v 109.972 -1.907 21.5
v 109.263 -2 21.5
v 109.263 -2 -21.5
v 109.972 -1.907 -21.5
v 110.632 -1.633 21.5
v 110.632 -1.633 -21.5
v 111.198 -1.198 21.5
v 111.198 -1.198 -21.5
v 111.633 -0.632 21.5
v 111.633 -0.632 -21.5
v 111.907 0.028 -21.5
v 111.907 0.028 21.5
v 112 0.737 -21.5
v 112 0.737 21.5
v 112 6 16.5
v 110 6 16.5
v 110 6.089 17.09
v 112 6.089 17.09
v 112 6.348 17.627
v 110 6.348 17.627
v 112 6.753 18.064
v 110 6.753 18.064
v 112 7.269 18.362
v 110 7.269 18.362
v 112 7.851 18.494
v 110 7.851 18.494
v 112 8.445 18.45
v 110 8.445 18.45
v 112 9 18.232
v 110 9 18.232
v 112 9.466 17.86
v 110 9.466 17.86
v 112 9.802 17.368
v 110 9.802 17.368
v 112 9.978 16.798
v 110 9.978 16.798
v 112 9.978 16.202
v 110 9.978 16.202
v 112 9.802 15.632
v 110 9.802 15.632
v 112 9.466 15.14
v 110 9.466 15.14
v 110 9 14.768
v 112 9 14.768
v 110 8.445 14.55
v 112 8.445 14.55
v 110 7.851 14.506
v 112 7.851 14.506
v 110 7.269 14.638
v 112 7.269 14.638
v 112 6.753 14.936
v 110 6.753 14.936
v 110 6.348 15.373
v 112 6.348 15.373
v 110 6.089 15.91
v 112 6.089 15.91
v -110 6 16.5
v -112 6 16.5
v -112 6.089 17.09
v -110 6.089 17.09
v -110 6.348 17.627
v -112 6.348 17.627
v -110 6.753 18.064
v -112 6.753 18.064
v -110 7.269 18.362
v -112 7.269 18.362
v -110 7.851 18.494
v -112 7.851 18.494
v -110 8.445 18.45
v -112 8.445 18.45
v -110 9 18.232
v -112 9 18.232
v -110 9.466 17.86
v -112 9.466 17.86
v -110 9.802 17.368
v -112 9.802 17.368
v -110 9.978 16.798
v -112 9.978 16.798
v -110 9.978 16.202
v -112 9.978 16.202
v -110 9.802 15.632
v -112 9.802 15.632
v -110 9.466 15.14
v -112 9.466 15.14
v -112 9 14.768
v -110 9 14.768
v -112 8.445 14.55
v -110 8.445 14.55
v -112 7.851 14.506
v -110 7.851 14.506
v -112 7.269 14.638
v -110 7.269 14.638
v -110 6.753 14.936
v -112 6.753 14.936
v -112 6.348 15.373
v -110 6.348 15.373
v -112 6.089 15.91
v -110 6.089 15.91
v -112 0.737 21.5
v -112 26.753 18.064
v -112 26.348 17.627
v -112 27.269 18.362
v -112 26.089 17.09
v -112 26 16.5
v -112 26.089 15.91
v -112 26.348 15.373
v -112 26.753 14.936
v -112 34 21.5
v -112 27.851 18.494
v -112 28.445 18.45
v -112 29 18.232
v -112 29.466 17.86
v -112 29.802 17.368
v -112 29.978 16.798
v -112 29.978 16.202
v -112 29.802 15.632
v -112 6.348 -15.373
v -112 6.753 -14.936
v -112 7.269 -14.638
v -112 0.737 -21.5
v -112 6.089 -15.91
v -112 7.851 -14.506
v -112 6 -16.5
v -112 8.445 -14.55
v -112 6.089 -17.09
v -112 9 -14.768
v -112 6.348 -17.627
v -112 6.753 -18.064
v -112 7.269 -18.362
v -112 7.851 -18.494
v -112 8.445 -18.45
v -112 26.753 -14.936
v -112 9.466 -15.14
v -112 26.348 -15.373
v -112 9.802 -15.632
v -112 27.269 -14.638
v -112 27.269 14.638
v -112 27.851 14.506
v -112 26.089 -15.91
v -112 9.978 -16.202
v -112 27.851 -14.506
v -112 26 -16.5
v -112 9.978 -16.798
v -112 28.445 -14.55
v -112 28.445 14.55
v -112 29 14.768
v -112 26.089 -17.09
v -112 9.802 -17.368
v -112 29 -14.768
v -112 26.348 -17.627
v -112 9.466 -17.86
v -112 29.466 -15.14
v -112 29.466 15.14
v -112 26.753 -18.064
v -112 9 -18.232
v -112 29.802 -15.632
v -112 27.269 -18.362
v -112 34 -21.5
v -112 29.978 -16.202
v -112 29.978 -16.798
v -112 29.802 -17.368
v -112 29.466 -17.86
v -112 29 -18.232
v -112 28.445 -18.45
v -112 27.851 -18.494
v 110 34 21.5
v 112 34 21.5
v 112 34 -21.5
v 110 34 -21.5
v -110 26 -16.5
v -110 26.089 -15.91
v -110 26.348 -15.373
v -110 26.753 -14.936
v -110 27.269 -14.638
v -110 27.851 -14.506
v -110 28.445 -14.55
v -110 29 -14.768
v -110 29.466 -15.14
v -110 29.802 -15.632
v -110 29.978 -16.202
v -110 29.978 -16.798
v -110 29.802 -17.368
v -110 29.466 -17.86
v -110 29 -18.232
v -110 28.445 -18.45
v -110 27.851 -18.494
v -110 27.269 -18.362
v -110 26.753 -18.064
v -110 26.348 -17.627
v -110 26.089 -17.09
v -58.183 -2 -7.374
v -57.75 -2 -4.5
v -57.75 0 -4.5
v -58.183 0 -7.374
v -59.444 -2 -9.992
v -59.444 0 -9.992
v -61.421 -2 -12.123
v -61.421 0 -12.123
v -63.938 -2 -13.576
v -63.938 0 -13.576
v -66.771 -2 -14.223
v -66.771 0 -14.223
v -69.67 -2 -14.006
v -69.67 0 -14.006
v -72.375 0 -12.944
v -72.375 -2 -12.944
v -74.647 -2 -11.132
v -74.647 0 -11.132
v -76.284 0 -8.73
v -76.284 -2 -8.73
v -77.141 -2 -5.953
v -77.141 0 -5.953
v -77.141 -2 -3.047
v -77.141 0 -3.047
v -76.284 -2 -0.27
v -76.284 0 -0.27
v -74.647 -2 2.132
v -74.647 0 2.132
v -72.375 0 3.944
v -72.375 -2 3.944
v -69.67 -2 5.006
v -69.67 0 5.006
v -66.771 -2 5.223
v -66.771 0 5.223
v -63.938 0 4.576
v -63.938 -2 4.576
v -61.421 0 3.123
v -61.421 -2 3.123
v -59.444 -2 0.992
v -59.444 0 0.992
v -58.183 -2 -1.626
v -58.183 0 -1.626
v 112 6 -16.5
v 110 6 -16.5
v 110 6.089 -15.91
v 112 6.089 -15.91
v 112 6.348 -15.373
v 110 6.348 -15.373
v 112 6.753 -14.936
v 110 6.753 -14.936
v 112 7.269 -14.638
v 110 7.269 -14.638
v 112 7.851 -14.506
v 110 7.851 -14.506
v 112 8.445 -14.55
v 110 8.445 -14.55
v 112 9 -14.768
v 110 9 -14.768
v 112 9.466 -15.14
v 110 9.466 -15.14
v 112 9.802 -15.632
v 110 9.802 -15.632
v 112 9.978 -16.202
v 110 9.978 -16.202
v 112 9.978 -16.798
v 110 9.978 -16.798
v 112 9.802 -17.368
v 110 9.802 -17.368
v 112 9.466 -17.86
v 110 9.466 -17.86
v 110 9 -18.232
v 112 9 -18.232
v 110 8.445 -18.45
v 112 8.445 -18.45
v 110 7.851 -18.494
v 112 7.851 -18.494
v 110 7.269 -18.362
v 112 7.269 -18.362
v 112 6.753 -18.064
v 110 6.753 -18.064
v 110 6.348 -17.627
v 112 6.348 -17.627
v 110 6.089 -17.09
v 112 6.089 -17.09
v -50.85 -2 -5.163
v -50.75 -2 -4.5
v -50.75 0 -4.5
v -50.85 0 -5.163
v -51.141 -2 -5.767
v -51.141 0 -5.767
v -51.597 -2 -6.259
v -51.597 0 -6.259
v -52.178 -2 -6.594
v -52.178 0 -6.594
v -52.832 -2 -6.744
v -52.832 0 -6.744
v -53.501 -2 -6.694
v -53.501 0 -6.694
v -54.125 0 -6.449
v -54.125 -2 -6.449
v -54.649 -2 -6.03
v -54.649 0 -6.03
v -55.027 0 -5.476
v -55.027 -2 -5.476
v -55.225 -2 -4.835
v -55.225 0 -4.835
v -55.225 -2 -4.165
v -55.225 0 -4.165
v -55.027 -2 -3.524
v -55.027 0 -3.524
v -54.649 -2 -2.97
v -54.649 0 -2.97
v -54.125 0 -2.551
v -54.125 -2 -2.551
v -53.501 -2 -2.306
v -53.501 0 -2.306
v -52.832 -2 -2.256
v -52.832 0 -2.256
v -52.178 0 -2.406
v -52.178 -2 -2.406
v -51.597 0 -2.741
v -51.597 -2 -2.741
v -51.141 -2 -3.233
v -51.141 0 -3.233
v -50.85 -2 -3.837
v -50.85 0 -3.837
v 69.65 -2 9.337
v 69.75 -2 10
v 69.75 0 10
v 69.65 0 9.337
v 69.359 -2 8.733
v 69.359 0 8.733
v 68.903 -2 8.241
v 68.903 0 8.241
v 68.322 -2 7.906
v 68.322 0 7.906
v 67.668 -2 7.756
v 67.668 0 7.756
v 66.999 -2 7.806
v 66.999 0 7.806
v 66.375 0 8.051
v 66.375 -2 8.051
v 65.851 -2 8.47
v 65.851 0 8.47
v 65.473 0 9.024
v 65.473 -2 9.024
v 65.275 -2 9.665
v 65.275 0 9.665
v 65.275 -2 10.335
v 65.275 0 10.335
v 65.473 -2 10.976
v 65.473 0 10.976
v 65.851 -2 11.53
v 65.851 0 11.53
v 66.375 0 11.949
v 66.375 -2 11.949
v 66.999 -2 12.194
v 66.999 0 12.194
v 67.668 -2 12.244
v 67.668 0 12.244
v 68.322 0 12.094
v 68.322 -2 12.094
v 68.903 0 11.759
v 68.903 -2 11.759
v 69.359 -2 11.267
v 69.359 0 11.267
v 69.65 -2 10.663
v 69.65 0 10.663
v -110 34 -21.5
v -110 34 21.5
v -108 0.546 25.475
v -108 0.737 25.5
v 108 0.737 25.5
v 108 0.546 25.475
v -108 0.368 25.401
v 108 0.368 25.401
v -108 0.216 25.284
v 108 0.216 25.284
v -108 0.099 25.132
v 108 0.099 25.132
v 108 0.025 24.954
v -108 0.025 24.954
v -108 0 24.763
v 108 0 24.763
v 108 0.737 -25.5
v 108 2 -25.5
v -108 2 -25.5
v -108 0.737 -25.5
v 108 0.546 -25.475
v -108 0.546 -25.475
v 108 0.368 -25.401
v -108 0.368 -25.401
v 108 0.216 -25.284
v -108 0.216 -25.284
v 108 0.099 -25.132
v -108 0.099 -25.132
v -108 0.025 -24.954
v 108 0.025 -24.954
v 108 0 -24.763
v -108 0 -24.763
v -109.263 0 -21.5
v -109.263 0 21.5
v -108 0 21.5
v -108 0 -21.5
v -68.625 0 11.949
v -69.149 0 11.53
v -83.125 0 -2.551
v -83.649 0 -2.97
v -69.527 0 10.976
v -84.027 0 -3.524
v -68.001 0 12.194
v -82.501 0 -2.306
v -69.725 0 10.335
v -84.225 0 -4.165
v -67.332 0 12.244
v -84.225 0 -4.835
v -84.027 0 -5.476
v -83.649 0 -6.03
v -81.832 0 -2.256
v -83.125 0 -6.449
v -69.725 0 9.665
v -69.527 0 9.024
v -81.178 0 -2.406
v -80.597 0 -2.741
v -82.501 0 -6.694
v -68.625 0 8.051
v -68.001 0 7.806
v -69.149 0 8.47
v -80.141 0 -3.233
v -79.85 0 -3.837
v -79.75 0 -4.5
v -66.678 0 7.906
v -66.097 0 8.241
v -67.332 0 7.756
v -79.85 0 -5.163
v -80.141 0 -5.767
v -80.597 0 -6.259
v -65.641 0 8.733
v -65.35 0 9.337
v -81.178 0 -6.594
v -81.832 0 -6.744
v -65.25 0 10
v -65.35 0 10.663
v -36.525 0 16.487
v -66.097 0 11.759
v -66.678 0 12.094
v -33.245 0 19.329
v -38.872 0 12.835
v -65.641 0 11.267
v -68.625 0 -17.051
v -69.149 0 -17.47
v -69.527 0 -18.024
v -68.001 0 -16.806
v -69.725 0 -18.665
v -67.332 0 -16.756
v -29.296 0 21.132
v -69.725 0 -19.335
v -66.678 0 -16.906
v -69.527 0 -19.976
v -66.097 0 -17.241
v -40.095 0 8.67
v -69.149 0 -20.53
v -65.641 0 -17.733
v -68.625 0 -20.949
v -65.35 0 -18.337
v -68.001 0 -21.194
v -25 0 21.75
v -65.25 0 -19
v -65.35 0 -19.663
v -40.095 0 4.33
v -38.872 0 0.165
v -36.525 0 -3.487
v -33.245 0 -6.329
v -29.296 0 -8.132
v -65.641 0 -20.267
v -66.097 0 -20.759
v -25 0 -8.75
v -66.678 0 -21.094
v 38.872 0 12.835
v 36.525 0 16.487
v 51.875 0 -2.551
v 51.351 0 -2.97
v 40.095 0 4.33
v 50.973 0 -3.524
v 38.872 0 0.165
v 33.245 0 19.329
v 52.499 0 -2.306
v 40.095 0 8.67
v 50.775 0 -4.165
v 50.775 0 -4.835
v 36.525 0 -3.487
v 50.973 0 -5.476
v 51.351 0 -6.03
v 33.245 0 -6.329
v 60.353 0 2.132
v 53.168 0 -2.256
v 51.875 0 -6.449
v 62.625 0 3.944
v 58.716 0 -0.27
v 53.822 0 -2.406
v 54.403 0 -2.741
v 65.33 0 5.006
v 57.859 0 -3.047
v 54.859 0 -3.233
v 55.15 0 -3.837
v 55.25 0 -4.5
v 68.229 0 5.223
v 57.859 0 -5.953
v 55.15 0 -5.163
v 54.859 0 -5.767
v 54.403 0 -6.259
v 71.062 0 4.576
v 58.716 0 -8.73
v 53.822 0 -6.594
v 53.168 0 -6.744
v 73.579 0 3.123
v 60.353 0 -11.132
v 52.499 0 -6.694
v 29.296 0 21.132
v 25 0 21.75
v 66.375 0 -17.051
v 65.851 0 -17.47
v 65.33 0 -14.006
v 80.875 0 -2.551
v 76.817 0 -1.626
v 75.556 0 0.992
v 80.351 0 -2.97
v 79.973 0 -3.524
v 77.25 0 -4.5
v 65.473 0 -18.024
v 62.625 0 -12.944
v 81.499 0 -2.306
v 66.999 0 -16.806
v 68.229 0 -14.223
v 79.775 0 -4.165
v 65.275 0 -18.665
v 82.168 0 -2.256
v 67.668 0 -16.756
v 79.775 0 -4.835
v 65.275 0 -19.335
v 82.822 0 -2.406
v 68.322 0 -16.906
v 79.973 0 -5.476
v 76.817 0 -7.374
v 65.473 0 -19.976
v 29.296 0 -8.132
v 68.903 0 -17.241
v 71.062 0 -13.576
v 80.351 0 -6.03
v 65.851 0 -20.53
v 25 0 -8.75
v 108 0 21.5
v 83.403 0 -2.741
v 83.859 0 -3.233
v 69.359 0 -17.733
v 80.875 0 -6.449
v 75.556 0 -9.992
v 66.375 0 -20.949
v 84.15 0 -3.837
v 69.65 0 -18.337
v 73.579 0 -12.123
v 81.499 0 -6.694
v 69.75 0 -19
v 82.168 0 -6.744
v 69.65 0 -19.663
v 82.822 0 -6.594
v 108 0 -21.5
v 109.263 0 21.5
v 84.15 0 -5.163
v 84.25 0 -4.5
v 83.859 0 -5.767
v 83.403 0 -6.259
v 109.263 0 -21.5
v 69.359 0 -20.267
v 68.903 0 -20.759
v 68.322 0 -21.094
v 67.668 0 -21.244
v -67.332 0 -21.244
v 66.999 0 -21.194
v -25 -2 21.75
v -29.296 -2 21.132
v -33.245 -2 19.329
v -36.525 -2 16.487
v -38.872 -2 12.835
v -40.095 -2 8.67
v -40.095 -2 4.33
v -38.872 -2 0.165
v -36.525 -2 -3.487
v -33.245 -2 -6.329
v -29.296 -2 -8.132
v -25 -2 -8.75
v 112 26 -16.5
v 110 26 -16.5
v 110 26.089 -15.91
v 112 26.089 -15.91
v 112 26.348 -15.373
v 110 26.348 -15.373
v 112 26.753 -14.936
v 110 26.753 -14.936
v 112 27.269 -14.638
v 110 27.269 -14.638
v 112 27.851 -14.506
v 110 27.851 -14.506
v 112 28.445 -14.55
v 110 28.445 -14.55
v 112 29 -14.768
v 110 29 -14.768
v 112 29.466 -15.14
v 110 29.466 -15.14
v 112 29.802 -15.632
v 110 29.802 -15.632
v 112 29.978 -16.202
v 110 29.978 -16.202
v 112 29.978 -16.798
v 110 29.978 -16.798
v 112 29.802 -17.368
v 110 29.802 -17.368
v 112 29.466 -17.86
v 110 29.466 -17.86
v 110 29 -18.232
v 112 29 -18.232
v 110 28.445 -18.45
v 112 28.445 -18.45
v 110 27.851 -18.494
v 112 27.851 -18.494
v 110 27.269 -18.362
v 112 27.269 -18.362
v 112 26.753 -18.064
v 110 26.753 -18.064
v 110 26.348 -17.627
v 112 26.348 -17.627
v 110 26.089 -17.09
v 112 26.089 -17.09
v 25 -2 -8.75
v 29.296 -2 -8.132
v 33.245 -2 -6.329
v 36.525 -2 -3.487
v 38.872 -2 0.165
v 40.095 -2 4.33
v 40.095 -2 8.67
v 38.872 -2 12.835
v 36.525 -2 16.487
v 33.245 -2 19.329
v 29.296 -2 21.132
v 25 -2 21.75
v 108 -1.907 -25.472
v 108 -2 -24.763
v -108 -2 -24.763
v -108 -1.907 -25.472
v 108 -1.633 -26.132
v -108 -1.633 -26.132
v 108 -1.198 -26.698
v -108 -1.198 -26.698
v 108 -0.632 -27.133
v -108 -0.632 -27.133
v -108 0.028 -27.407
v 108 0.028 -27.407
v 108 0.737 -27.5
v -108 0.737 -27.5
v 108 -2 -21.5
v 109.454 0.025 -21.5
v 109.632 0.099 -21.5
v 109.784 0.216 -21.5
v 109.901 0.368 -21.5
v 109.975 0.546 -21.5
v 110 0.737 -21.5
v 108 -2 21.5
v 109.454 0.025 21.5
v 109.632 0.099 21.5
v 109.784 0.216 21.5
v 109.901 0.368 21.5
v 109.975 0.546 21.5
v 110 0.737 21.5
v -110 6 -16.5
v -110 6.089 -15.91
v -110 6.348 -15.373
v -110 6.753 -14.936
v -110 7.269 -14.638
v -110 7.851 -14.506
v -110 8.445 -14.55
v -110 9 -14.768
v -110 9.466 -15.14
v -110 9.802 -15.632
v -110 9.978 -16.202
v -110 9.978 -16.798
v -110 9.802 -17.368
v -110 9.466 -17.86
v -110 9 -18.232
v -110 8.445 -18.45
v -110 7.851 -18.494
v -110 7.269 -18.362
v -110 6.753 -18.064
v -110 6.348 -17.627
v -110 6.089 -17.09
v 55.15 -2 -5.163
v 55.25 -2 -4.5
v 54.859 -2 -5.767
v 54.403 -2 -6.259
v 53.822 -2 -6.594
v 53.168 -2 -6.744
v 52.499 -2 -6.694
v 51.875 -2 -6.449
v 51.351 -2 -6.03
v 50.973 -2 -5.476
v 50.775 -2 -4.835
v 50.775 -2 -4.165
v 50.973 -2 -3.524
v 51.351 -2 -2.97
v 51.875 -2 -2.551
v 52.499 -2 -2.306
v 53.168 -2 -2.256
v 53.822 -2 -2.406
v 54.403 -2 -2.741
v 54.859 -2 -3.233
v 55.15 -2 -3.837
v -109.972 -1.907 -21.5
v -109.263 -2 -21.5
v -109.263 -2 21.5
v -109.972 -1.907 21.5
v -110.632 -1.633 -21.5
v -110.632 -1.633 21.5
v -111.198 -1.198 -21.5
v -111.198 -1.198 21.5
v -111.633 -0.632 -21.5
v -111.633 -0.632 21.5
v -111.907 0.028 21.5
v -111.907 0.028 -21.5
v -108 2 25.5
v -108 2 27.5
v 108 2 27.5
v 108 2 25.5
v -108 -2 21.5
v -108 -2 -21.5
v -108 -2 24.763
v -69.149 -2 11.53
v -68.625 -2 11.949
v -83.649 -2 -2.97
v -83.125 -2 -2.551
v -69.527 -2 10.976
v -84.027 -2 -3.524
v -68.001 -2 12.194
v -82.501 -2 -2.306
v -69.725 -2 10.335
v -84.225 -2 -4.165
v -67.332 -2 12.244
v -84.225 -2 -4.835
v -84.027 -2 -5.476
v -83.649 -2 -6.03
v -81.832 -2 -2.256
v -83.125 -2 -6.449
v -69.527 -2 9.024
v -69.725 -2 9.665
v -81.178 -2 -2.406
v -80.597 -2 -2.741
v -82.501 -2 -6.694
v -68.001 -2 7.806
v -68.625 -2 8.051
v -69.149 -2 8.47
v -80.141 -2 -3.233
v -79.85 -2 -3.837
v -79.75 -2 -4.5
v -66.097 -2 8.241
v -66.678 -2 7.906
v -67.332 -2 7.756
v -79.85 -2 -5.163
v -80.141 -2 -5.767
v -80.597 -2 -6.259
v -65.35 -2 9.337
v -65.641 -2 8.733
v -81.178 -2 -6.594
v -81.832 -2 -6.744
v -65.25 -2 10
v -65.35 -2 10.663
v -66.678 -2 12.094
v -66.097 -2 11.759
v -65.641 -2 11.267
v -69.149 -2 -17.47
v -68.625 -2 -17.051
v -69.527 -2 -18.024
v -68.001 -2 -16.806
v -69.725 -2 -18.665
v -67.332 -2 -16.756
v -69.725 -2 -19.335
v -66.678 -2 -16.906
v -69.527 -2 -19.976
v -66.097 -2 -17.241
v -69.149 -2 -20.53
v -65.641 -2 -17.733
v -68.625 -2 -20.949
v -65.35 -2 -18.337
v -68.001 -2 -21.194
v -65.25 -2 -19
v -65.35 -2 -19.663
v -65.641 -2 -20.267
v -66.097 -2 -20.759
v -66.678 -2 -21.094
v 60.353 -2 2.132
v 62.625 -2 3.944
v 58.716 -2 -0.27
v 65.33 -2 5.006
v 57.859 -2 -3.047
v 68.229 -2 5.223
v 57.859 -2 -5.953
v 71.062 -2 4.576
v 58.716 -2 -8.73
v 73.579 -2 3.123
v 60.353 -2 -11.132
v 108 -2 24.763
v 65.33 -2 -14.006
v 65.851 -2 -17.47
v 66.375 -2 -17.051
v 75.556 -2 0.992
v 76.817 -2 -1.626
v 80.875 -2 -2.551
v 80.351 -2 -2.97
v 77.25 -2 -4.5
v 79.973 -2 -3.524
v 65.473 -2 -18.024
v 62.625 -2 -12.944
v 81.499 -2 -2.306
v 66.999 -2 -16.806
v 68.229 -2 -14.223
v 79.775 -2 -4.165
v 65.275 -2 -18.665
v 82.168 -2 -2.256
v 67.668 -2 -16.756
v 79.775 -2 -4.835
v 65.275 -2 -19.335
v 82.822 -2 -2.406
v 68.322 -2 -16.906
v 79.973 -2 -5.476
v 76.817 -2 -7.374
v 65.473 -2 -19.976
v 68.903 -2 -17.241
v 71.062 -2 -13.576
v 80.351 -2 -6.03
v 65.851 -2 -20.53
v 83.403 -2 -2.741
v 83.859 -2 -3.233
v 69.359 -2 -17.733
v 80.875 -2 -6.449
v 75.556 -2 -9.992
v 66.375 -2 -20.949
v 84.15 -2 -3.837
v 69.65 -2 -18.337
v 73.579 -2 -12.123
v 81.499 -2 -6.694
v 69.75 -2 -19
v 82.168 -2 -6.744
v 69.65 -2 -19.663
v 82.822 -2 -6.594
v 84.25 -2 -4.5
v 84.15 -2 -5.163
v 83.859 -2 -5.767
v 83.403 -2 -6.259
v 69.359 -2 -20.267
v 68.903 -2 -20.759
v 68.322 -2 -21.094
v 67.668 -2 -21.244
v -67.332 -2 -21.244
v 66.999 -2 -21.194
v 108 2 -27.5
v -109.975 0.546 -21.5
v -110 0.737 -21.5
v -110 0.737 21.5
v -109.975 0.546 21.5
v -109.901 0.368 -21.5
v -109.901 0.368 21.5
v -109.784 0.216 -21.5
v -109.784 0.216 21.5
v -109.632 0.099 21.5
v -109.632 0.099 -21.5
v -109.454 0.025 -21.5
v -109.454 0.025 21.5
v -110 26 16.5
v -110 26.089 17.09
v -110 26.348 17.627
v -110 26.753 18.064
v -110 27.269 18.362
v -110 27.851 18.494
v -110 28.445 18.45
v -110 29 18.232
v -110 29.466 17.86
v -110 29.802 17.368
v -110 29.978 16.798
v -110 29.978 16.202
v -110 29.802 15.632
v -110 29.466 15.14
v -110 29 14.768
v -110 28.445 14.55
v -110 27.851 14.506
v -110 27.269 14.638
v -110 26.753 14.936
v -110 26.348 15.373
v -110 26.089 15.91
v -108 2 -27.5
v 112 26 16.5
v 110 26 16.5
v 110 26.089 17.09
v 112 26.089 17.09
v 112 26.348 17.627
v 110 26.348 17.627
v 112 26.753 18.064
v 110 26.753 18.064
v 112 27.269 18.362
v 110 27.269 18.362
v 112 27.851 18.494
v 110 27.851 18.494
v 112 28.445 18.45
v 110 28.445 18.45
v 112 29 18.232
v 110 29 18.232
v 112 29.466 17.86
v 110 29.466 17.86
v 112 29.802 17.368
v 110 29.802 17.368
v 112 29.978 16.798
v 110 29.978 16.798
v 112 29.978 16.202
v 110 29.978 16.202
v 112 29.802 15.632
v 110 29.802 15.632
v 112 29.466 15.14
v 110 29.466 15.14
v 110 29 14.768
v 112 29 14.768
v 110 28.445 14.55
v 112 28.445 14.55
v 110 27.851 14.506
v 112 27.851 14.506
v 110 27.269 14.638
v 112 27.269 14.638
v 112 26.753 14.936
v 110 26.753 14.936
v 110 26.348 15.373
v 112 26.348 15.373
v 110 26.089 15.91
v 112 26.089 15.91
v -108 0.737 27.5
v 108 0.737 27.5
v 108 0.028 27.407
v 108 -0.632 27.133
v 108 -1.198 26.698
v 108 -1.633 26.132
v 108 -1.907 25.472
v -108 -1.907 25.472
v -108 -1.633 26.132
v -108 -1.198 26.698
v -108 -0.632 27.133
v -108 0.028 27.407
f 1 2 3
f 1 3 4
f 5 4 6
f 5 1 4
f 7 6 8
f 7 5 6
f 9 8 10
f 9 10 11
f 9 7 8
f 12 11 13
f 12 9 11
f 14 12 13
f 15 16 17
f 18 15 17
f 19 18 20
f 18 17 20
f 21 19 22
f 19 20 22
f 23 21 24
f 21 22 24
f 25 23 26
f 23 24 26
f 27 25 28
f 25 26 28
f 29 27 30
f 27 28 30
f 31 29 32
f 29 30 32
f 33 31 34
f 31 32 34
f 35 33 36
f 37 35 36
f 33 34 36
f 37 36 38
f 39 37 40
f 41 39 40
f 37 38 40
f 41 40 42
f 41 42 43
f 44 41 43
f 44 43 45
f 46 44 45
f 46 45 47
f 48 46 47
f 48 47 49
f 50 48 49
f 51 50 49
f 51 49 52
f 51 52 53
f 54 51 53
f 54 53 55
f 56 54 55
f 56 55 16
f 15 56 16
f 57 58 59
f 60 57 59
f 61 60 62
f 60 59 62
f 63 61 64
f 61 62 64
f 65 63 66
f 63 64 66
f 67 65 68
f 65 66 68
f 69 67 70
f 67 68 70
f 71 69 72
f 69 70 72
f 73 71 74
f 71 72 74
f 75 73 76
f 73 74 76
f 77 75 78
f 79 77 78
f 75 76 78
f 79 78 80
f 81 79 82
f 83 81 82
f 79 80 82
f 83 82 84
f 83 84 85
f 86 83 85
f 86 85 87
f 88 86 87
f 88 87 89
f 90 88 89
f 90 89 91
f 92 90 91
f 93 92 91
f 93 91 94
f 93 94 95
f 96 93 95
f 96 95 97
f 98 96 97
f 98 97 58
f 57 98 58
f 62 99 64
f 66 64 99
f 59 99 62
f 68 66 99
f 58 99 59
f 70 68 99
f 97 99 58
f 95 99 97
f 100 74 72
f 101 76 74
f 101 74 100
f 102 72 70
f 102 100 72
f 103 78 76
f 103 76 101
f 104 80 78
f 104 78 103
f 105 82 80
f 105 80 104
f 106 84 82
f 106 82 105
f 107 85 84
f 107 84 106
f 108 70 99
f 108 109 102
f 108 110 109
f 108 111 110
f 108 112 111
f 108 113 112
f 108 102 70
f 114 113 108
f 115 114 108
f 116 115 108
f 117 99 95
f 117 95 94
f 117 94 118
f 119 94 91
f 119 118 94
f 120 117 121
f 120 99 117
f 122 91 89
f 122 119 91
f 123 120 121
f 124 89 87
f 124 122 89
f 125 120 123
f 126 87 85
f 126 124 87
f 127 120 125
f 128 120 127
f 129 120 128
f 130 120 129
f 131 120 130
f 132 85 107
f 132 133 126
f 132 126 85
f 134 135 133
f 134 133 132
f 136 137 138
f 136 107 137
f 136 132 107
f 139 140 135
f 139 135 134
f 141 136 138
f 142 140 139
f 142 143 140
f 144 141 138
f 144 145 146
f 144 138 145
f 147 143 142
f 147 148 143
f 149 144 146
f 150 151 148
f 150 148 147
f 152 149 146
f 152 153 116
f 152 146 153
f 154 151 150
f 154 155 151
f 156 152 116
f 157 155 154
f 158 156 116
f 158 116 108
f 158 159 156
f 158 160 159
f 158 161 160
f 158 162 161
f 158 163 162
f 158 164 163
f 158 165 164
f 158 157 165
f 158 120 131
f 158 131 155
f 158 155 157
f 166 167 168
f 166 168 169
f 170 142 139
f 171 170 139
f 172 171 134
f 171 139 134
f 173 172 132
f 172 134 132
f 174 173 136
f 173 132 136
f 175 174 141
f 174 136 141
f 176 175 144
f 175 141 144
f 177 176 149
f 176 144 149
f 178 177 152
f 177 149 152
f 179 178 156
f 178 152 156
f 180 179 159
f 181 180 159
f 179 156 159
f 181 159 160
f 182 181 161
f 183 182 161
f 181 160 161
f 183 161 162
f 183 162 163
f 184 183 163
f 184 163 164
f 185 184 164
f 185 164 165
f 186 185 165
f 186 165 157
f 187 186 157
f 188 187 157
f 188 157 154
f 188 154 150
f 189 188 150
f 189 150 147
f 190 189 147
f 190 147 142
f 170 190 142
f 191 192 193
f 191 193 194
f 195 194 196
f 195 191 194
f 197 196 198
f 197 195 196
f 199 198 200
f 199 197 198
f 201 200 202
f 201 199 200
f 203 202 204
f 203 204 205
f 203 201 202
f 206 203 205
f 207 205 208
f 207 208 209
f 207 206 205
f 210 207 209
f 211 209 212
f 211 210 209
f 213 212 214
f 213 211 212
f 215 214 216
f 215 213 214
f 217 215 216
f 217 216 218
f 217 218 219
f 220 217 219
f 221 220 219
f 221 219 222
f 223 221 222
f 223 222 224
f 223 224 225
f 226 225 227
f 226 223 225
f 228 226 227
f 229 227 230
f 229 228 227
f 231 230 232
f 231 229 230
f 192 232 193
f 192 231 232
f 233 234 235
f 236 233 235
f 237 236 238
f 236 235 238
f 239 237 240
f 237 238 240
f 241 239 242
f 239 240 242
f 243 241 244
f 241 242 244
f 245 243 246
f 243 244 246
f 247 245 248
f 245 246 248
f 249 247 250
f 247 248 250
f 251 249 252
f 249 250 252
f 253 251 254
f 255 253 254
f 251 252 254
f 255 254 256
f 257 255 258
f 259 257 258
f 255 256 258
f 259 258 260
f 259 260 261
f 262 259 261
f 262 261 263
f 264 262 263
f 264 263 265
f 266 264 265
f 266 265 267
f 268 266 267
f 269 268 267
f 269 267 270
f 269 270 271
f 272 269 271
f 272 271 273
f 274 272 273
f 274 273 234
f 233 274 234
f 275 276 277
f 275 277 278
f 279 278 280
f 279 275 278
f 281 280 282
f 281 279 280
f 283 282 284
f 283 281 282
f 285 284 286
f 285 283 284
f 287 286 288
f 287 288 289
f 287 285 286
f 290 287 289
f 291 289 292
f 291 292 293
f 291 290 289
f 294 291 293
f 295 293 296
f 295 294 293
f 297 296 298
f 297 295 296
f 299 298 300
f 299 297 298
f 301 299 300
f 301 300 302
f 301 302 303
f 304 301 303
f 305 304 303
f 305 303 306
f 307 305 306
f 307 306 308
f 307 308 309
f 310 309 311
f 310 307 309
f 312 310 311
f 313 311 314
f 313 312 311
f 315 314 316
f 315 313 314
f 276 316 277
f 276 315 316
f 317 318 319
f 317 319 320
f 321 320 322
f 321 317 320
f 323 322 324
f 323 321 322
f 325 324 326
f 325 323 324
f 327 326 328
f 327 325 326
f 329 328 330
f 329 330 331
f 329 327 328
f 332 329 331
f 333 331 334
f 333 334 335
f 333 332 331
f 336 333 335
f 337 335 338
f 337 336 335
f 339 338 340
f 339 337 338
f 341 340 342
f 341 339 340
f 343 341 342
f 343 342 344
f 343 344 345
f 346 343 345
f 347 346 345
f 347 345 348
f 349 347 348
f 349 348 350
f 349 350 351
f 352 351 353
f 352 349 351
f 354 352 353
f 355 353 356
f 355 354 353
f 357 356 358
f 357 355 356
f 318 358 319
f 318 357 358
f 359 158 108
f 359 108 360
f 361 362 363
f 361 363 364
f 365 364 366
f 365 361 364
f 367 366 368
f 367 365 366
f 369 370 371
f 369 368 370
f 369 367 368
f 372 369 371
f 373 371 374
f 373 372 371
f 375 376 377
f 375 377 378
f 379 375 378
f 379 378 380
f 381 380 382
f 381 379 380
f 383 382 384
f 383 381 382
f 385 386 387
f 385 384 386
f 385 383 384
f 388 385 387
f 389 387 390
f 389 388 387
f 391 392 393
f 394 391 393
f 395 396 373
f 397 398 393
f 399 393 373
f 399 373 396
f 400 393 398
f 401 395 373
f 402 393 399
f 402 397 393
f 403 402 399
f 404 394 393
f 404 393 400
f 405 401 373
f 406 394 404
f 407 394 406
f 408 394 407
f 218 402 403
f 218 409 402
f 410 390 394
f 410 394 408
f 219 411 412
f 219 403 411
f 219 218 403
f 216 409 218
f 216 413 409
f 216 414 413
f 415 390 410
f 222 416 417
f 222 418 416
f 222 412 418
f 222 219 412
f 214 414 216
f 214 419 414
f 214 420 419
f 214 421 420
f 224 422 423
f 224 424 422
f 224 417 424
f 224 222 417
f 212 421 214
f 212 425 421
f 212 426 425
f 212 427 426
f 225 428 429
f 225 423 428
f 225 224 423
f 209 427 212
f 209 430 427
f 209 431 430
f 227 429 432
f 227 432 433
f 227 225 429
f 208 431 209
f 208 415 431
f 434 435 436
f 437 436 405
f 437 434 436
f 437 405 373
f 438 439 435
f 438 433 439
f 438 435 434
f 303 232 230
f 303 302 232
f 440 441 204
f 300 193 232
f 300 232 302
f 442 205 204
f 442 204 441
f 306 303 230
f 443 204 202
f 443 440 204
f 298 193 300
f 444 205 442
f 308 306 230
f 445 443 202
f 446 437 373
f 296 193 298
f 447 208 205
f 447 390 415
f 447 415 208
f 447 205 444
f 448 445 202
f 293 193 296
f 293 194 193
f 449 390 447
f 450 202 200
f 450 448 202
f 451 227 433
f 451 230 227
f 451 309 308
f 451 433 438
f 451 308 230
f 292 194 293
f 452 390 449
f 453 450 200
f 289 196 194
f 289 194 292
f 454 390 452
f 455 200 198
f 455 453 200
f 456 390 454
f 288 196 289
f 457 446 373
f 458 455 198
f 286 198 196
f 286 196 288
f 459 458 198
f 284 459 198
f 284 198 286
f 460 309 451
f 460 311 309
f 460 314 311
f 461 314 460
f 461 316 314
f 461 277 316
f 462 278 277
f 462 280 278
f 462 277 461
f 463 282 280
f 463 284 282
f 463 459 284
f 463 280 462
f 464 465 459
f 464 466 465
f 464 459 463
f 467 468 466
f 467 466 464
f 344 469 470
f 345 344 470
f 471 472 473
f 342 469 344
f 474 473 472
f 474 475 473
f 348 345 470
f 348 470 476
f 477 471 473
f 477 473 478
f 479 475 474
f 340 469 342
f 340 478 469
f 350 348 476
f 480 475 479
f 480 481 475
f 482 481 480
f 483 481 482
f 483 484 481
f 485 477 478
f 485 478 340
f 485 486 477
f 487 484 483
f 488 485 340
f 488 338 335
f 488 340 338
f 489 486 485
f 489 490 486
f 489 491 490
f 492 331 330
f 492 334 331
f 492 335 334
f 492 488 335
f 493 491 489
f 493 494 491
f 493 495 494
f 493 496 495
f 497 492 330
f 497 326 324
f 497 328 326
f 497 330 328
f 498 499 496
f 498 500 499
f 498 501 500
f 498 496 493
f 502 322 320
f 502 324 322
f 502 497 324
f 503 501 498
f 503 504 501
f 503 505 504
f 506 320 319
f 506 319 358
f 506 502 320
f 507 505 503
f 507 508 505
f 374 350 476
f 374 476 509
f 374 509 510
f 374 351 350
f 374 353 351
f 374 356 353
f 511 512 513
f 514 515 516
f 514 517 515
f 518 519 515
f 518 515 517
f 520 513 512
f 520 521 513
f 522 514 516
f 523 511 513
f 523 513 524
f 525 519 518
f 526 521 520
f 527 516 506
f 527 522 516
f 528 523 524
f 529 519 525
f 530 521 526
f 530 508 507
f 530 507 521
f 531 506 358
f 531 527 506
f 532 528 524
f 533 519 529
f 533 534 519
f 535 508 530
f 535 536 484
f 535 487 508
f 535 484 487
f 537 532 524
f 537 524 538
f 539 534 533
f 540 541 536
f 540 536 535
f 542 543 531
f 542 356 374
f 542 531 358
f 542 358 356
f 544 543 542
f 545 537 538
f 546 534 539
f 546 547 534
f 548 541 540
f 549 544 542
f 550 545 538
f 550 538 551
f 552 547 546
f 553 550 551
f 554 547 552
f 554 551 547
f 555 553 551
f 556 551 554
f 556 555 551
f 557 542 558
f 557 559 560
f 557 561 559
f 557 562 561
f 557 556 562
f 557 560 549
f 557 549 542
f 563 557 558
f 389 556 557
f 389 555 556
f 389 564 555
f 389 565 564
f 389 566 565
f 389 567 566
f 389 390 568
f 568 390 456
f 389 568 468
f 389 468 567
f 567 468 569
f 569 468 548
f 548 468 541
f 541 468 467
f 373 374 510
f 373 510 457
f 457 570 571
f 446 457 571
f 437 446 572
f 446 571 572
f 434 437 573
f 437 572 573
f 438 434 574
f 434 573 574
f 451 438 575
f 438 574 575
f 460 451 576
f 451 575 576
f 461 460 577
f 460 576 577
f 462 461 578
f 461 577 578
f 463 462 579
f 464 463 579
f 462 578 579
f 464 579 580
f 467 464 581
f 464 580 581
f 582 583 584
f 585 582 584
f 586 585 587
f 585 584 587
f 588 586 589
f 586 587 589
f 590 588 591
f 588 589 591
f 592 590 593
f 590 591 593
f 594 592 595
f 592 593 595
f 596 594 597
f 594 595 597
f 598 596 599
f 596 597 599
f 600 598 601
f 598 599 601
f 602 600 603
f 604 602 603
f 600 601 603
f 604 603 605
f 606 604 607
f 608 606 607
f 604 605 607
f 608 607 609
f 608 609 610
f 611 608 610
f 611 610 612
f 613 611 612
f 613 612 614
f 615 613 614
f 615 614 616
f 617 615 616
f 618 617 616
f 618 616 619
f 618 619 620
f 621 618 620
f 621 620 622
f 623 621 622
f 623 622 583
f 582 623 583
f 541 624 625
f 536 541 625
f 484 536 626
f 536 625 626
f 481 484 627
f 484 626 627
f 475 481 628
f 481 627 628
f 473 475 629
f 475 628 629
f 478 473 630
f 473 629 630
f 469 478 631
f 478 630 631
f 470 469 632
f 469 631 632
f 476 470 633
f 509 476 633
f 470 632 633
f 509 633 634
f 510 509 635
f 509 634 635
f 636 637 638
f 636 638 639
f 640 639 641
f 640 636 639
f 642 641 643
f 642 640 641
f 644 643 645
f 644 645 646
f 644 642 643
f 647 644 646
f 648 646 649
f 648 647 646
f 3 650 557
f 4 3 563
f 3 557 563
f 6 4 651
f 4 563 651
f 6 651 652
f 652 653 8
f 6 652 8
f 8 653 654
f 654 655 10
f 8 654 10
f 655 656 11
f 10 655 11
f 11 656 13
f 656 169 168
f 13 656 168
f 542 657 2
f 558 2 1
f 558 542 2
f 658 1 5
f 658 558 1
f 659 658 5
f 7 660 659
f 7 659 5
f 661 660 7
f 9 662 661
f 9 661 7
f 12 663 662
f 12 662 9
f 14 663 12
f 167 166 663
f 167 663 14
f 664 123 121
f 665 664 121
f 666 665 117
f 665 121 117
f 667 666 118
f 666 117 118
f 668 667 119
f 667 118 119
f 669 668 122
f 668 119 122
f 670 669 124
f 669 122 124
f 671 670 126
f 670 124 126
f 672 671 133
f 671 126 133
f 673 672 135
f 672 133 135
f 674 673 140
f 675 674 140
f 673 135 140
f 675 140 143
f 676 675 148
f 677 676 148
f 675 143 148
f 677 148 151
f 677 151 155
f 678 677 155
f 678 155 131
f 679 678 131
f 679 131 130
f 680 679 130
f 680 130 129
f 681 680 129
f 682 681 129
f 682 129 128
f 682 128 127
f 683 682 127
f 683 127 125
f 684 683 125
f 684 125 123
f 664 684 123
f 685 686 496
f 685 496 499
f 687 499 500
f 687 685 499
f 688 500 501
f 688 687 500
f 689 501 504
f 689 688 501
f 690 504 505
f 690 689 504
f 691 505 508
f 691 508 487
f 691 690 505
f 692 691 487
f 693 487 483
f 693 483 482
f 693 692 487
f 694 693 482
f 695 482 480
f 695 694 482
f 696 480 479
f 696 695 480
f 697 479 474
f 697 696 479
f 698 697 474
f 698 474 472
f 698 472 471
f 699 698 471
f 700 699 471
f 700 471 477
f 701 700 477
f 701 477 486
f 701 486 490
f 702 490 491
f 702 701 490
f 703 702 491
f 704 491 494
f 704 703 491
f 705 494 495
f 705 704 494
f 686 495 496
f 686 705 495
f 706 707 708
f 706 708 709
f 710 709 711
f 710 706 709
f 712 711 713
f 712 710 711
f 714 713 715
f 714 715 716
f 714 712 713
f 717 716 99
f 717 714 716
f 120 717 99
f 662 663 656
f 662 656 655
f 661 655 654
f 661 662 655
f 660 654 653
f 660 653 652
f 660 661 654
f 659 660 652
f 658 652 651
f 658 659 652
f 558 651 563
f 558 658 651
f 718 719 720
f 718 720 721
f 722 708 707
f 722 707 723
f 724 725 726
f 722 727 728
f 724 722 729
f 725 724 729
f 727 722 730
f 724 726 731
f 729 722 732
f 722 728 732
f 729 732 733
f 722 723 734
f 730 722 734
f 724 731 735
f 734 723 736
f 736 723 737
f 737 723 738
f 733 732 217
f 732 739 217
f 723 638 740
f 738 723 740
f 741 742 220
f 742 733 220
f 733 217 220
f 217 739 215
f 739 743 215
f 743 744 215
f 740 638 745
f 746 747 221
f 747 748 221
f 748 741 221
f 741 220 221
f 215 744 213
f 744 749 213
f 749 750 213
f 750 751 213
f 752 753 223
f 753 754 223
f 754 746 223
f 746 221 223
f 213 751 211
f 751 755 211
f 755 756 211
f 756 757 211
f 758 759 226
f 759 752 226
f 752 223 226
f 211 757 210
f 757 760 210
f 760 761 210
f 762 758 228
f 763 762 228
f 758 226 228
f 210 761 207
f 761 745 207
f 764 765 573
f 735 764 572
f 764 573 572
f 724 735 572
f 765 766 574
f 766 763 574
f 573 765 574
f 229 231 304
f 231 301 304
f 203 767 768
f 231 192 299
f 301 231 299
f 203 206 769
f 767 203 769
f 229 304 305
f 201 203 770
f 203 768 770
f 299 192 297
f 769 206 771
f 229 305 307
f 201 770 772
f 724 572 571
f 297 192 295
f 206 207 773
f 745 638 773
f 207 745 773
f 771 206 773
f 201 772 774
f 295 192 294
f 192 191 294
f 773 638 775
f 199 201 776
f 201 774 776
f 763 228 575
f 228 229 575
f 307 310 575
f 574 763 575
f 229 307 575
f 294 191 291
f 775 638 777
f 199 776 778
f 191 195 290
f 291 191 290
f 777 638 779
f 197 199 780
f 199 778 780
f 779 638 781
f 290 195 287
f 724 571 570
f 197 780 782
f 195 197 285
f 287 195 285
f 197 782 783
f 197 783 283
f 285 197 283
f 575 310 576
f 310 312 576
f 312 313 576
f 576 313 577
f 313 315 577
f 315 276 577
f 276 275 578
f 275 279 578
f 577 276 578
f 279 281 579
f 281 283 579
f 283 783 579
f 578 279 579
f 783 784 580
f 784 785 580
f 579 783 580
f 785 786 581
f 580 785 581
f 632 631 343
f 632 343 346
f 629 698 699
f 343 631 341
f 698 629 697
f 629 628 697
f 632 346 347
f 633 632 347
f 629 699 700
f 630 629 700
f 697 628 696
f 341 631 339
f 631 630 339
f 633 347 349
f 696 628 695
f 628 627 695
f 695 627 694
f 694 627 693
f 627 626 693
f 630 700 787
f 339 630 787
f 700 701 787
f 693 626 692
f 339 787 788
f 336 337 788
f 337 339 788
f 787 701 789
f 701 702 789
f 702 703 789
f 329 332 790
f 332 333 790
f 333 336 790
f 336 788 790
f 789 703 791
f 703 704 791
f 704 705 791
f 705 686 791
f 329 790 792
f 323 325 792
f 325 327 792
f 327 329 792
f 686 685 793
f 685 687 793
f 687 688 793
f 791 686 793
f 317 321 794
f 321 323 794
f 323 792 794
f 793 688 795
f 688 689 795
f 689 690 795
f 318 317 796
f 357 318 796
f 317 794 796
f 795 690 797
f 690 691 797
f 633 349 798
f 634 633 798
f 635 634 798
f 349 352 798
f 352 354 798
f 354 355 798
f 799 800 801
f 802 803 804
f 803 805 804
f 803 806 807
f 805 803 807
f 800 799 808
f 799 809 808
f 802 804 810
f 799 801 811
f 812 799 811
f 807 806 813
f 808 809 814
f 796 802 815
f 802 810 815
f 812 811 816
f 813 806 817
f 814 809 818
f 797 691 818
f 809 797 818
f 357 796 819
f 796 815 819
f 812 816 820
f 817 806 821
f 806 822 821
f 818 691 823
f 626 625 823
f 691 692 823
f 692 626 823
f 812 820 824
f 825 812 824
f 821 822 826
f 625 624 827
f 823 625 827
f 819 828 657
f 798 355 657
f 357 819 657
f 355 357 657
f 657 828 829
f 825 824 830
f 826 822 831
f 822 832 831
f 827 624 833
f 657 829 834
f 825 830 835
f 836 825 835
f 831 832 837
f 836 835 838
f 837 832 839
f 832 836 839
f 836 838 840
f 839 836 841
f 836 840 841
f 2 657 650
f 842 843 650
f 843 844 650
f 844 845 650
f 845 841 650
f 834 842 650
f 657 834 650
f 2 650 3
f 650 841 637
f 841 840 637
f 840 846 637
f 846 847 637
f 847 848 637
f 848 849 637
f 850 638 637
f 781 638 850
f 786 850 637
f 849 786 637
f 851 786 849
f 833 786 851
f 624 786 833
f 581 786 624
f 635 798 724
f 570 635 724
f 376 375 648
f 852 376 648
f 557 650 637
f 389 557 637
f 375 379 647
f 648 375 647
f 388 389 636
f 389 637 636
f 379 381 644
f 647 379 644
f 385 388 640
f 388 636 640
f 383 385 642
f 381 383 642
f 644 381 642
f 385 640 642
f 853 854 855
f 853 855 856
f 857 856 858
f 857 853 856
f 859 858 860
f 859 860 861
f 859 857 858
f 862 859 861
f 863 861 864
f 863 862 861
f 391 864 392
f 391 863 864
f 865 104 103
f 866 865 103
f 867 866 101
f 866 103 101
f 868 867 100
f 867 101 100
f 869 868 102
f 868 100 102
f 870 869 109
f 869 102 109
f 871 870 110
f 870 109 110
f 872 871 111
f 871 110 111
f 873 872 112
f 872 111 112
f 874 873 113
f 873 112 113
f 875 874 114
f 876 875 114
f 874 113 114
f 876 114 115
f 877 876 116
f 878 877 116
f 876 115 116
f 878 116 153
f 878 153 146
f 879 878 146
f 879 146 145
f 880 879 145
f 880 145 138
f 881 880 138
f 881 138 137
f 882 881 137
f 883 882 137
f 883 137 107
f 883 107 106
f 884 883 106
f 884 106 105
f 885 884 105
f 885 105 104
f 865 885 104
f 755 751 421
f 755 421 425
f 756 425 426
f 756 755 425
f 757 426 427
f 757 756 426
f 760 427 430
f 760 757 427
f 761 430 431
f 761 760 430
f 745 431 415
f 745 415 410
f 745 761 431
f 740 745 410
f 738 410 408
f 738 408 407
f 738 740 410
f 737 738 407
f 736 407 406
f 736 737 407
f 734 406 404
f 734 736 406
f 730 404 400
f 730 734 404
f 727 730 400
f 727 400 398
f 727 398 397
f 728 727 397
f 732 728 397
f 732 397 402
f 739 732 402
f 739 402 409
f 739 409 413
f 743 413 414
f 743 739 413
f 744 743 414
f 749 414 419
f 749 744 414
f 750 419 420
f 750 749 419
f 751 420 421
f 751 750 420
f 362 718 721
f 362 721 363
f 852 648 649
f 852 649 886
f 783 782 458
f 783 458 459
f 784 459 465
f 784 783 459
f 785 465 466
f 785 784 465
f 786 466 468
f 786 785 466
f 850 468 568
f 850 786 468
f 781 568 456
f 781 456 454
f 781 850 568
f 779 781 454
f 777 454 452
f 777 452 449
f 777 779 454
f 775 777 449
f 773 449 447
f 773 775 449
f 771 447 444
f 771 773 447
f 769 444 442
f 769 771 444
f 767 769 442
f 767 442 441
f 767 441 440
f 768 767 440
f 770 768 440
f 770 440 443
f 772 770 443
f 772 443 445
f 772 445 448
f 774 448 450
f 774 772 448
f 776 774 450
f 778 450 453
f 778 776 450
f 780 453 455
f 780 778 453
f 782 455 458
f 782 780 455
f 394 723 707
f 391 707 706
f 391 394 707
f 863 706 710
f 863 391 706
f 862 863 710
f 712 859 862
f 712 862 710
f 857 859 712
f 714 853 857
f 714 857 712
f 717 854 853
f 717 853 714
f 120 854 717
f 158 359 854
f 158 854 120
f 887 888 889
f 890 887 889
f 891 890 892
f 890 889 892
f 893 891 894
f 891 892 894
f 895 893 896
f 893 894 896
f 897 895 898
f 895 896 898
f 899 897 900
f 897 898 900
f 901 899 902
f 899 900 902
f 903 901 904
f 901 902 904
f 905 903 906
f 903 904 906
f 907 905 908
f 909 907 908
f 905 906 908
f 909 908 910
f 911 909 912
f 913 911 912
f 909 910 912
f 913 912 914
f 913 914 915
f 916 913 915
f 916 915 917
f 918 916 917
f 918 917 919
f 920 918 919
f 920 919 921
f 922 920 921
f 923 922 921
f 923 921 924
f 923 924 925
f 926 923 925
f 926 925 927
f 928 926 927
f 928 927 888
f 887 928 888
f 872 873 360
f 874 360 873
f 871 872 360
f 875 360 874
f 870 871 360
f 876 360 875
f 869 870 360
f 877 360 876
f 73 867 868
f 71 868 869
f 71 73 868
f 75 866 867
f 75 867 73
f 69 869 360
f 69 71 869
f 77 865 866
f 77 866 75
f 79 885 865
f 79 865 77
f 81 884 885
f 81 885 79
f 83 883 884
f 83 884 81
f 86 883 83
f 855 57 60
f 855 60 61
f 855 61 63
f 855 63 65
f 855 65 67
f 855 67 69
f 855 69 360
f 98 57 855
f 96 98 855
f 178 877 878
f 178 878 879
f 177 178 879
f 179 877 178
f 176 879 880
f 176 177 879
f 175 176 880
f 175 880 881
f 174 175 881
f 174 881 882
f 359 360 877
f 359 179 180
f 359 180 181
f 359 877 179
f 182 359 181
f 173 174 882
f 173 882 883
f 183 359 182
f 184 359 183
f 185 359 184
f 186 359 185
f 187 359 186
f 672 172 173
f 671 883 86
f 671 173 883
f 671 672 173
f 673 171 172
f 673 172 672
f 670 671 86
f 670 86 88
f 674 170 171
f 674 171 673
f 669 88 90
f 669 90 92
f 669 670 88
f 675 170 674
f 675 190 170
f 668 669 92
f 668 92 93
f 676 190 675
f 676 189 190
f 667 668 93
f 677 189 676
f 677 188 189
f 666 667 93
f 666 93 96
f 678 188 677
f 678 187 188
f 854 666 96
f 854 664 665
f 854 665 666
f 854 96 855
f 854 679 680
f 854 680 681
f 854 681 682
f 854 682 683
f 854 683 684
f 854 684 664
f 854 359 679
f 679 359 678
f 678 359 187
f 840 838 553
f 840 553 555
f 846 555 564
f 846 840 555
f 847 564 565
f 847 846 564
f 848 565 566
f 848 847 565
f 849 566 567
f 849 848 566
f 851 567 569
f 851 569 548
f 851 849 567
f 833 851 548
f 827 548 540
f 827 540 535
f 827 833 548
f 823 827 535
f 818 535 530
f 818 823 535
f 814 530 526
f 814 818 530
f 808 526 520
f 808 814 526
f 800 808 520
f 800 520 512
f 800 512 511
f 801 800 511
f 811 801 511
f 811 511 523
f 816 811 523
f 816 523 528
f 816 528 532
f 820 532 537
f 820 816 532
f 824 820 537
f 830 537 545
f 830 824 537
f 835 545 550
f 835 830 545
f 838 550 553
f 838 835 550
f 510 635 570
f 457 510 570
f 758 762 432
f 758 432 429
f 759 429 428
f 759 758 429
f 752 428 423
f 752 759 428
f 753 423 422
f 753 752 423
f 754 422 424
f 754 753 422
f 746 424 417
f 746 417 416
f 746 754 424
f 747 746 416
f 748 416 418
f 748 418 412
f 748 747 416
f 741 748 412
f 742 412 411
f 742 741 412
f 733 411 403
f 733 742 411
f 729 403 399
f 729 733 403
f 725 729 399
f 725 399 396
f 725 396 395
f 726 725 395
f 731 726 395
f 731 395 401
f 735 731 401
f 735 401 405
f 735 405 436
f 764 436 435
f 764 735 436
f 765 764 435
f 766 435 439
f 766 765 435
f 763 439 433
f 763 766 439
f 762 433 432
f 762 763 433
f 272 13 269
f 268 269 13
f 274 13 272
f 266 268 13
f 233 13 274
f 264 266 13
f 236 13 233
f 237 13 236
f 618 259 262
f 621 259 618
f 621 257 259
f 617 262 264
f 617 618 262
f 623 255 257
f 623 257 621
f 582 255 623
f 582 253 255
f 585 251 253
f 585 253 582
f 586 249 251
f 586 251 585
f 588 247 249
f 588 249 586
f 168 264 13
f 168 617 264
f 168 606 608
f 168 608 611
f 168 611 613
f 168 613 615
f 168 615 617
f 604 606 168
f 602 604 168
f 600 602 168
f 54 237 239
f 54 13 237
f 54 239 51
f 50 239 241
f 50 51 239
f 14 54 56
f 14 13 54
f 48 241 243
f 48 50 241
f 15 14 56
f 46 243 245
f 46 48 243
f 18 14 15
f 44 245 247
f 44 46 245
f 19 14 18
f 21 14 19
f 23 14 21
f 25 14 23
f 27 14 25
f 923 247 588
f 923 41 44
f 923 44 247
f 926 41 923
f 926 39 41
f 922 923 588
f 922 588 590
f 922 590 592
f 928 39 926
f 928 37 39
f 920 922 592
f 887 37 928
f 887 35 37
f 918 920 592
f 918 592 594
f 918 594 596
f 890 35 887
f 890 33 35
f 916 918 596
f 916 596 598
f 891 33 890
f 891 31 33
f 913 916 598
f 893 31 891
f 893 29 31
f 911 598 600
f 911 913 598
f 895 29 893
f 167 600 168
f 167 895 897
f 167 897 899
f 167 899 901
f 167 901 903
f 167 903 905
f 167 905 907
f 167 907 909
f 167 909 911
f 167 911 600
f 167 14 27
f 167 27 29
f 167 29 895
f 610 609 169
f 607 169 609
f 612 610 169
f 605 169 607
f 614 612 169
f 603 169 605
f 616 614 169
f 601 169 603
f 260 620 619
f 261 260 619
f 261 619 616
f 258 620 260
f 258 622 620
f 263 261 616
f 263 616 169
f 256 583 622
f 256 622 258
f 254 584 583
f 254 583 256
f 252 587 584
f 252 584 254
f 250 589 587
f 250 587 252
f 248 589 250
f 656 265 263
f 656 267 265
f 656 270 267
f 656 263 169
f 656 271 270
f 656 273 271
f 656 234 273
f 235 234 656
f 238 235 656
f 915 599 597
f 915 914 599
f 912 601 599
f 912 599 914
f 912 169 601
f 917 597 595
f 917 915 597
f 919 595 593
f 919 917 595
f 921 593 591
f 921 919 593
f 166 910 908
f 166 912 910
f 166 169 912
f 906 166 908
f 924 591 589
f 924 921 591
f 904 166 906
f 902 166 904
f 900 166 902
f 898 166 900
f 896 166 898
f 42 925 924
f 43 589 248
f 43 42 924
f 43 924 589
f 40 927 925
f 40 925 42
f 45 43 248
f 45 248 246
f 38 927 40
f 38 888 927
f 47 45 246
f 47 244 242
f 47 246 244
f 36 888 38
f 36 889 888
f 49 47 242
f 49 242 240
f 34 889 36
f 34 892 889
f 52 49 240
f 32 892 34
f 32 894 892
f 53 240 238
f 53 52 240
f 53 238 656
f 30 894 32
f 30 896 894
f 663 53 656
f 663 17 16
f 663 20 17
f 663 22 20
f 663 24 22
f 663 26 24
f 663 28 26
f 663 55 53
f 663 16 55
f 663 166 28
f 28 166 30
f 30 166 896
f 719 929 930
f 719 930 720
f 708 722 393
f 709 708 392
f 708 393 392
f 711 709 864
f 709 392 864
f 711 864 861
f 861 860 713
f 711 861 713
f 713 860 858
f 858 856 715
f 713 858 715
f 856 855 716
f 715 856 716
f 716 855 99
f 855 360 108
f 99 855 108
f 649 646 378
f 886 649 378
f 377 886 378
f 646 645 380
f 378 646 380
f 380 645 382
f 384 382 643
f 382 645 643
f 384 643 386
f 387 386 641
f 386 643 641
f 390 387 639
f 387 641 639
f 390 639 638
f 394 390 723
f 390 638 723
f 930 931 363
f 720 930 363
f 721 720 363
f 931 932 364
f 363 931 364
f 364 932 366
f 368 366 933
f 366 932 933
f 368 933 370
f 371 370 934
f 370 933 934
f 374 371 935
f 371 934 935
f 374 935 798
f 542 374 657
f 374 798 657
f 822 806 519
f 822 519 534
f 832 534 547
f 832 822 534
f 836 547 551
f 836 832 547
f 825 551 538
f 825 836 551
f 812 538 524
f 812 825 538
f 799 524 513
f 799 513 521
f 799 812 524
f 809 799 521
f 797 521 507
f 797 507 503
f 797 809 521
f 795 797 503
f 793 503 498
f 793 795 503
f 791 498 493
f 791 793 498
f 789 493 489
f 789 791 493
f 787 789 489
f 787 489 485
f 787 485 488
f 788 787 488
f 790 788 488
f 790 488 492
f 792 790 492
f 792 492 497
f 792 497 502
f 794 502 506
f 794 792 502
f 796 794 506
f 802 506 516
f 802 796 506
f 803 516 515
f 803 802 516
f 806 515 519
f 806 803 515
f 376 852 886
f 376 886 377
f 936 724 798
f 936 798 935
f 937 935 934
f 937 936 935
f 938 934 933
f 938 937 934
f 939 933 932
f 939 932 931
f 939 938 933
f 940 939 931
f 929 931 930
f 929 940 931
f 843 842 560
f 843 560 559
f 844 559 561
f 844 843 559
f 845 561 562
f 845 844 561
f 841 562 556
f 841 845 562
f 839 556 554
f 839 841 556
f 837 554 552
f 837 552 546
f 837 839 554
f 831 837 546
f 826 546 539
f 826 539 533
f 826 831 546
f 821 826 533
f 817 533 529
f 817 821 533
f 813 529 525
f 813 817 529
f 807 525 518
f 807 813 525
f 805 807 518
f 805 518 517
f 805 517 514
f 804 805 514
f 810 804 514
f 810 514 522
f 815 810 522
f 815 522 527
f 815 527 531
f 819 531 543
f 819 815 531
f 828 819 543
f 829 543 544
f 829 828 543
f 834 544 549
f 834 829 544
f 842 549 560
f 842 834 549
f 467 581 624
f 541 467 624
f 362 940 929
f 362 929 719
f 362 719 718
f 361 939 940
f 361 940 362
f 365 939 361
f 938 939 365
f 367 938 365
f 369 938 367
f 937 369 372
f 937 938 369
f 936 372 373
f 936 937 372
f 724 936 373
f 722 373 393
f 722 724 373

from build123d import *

# Parameters (mm, degrees)
BASE_FLANGE1_START             = -2
BASE_FLANGE1_OUTLINE_R         = 2.25
BASE_FLANGE1_OUTLINE_R_2       = 9.75
BASE_FLANGE1_DEPTH             = 2
EDGE_FLANGE1_STRIP_W           = 9.4732
EDGE_FLANGE1_STRIP_H           = 2
EDGE_FLANGE1_STRIP_CUT_DEPTH   = 220
EDGE_FLANGE1_STRIP_2_W         = 9.4732
EDGE_FLANGE1_STRIP_2_H         = 2
EDGE_FLANGE1_STRIP_CUT_2_DEPTH = 220
EDGE_FLANGE1_DEPTH             = 220
EDGE_FLANGE1_BEND_DEPTH        = 220
EDGE_FLANGE2_STRIP_W           = 9.4732
EDGE_FLANGE2_STRIP_H           = 2
EDGE_FLANGE2_STRIP_CUT_DEPTH   = 43
EDGE_FLANGE2_STRIP_2_W         = 9.4732
EDGE_FLANGE2_STRIP_2_H         = 2
EDGE_FLANGE2_STRIP_CUT_2_DEPTH = 43
EDGE_FLANGE2_DEPTH             = 43
EDGE_FLANGE2_BEND_DEPTH        = 43
SKETCH19_R                     = 2
CUT_EXTRUDE3_DEPTH             = 229.228503917
CUT_EXTRUDE4_DEPTH             = 121.814941129


# Read off the part's stored shape, not the designer's step: Base-Flange1
# Sheet-metal steps are written as plain solids
with BuildPart() as part:
    # Base-Flange1 outline → Base-Flange1 (new body)
    with BuildSketch(Plane(origin=(0, 0, 0), x_dir=(1, 0, 0), z_dir=(0, 1, 0)).offset(BASE_FLANGE1_START)):
        Polygon((108, 23.5), (110, 23.5), (110, 27.5), (-110, 27.5), (-110, 23.5), (-108, 23.5), (-108, 21.5), (-110, 21.5), (-110, -21.5), (-108, -21.5), (-108, -23.5), (-110, -23.5), (-110, -27.5), (110, -27.5), (110, -23.5), (108, -23.5), (108, -21.5), (110, -21.5), (110, 21.5), (108, 21.5), align=None)
        with Locations((-67.5, -10)):
            Circle(BASE_FLANGE1_OUTLINE_R, mode=Mode.SUBTRACT)
        with BuildLine():
            ThreePointArc((-25, -21.75), (-40.25, -6.5), (-25, 8.75))
            Line((-25, 8.75), (25, 8.75))
            ThreePointArc((25, 8.75), (40.25, -6.5), (25, -21.75))
            Line((25, -21.75), (-25, -21.75))
        make_face(mode=Mode.SUBTRACT)
        with Locations((67.5, -10)):
            Circle(BASE_FLANGE1_OUTLINE_R, mode=Mode.SUBTRACT)
        with Locations((-82, 4.5)):
            Circle(BASE_FLANGE1_OUTLINE_R, mode=Mode.SUBTRACT)
        with Locations((-67.5, 4.5)):
            Circle(BASE_FLANGE1_OUTLINE_R_2, mode=Mode.SUBTRACT)
        with Locations((-53, 4.5)):
            Circle(BASE_FLANGE1_OUTLINE_R, mode=Mode.SUBTRACT)
        with Locations((-67.5, 19)):
            Circle(BASE_FLANGE1_OUTLINE_R, mode=Mode.SUBTRACT)
        with Locations((53, 4.5)):
            Circle(BASE_FLANGE1_OUTLINE_R, mode=Mode.SUBTRACT)
        with Locations((67.5, 4.5)):
            Circle(BASE_FLANGE1_OUTLINE_R_2, mode=Mode.SUBTRACT)
        with Locations((82, 4.5)):
            Circle(BASE_FLANGE1_OUTLINE_R, mode=Mode.SUBTRACT)
        with Locations((67.5, 19)):
            Circle(BASE_FLANGE1_OUTLINE_R, mode=Mode.SUBTRACT)
    extrude(amount=BASE_FLANGE1_DEPTH)

    # Edge-Flange1 strip (across the edge) → Edge-Flange1 strip cut (cut)
    with BuildSketch(Plane(origin=(110, 0, -27.5), x_dir=(0, 0, 1), z_dir=(-1, 0, 0))):
        with Locations((-2, -1)):
            Rectangle(EDGE_FLANGE1_STRIP_W, EDGE_FLANGE1_STRIP_H)
    extrude(amount=EDGE_FLANGE1_STRIP_CUT_DEPTH, mode=Mode.SUBTRACT)

    # Edge-Flange1 strip 2 (across the edge) → Edge-Flange1 strip cut 2 (cut)
    with BuildSketch(Plane(origin=(-110, 0, 27.5), x_dir=(0, 0, -1), z_dir=(1, 0, 0))):
        with Locations((-2, -1)):
            Rectangle(EDGE_FLANGE1_STRIP_2_W, EDGE_FLANGE1_STRIP_2_H)
    extrude(amount=EDGE_FLANGE1_STRIP_CUT_2_DEPTH, mode=Mode.SUBTRACT)

    # Edge-Flange1 section (across the edge) → Edge-Flange1 (add)
    with BuildSketch(Plane(origin=(110, 0, -27.5), x_dir=(0, 0, 1), z_dir=(-1, 0, 0))):
        with BuildLine():
            Line((0, 0.7366), (0, 2))
            Line((0, 2), (2, 2))
            Line((2, 2), (2, 0.7366))
            ThreePointArc((2, 0.7366), (2.215745145, 0.215745145), (2.7366, 0))
            Line((2.7366, 0), (2.7366, -2))
            ThreePointArc((2.7366, -2), (0.801531583, -1.198468417), (0, 0.7366))
        make_face()
    extrude(amount=EDGE_FLANGE1_DEPTH)

    # Edge-Flange1 section 2 (across the edge) → Edge-Flange1 bend (add)
    with BuildSketch(Plane(origin=(-110, 0, 27.5), x_dir=(0, 0, -1), z_dir=(1, 0, 0))):
        with BuildLine():
            Line((0, 0.7366), (0, 2))
            Line((0, 2), (2, 2))
            Line((2, 2), (2, 0.7366))
            ThreePointArc((2, 0.7366), (2.215745145, 0.215745145), (2.7366, 0))
            Line((2.7366, 0), (2.7366, -2))
            ThreePointArc((2.7366, -2), (0.801531583, -1.198468417), (0, 0.7366))
        make_face()
    extrude(amount=EDGE_FLANGE1_BEND_DEPTH)

    # Edge-Flange2 strip (across the edge) → Edge-Flange2 strip cut (cut)
    with BuildSketch(Plane(origin=(-110, 0, -21.5), x_dir=(1, 0, 0), z_dir=(0, 0, 1))):
        with Locations((-4, -1)):
            Rectangle(EDGE_FLANGE2_STRIP_W, EDGE_FLANGE2_STRIP_H)
    extrude(amount=EDGE_FLANGE2_STRIP_CUT_DEPTH, mode=Mode.SUBTRACT)

    # Edge-Flange2 strip 2 (across the edge) → Edge-Flange2 strip cut 2 (cut)
    with BuildSketch(Plane(origin=(110, 0, 21.5), x_dir=(-1, 0, 0), z_dir=(0, 0, -1))):
        with Locations((-4, -1)):
            Rectangle(EDGE_FLANGE2_STRIP_2_W, EDGE_FLANGE2_STRIP_2_H)
    extrude(amount=EDGE_FLANGE2_STRIP_CUT_2_DEPTH, mode=Mode.SUBTRACT)

    # Edge-Flange2 section (across the edge) → Edge-Flange2 (add)
    with BuildSketch(Plane(origin=(-110, 0, -21.5), x_dir=(1, 0, 0), z_dir=(0, 0, 1))):
        with BuildLine():
            Line((-2, 0.7366), (-2, 34))
            Line((-2, 34), (0, 34))
            Line((0, 34), (0, 0.7366))
            ThreePointArc((0, 0.7366), (0.215745145, 0.215745145), (0.7366, 0))
            Line((0.7366, 0), (0.7366, -2))
            ThreePointArc((0.7366, -2), (-1.198468417, -1.198468417), (-2, 0.7366))
        make_face()
    extrude(amount=EDGE_FLANGE2_DEPTH)

    # Edge-Flange2 section 2 (across the edge) → Edge-Flange2 bend (add)
    with BuildSketch(Plane(origin=(110, 0, 21.5), x_dir=(-1, 0, 0), z_dir=(0, 0, -1))):
        with BuildLine():
            Line((-2, 0.7366), (-2, 34))
            Line((-2, 34), (0, 34))
            Line((0, 34), (0, 0.7366))
            ThreePointArc((0, 0.7366), (0.215745145, 0.215745145), (0.7366, 0))
            Line((0.7366, 0), (0.7366, -2))
            ThreePointArc((0.7366, -2), (-1.198468417, -1.198468417), (-2, 0.7366))
        make_face()
    extrude(amount=EDGE_FLANGE2_BEND_DEPTH)

    # Sketch19 → Cut-Extrude3 (cut, through all)
    with BuildSketch(Plane.ZY.offset(112)):
        with Locations(Location((-16.5, 28, 0), (0, 0, 270))):
            Circle(SKETCH19_R)
        with Locations(Location((-16.5, 8, 0), (0, 0, 270))):
            Circle(SKETCH19_R)
        with Locations(Location((16.5, 8, 0), (0, 0, 270))):
            Circle(SKETCH19_R)
        with Locations(Location((16.5, 28, 0), (0, 0, 270))):
            Circle(SKETCH19_R)
    extrude(amount=-CUT_EXTRUDE3_DEPTH, mode=Mode.SUBTRACT)

    # Sketch22 → Cut-Extrude4 (cut, through all)
    with BuildSketch(Plane.XZ.offset(2)):
        Polygon((-108, 23.5), (-110, 23.5), (-110, 24.7634), (-110, 27.5), (-108, 27.5), align=None)
        Polygon((-108, -23.5), (-108, -27.5), (-110, -27.5), (-110, -24.7634), (-110, -23.5), align=None)
        Polygon((108, -23.5), (110, -23.5), (110, -24.7634), (110, -27.5), (108, -27.5), align=None)
        Polygon((108, 23.5), (108, 27.5), (110, 27.5), (110, 24.7634), (110, 23.5), align=None)
    extrude(amount=-CUT_EXTRUDE4_DEPTH, mode=Mode.SUBTRACT)


solid = part.part
